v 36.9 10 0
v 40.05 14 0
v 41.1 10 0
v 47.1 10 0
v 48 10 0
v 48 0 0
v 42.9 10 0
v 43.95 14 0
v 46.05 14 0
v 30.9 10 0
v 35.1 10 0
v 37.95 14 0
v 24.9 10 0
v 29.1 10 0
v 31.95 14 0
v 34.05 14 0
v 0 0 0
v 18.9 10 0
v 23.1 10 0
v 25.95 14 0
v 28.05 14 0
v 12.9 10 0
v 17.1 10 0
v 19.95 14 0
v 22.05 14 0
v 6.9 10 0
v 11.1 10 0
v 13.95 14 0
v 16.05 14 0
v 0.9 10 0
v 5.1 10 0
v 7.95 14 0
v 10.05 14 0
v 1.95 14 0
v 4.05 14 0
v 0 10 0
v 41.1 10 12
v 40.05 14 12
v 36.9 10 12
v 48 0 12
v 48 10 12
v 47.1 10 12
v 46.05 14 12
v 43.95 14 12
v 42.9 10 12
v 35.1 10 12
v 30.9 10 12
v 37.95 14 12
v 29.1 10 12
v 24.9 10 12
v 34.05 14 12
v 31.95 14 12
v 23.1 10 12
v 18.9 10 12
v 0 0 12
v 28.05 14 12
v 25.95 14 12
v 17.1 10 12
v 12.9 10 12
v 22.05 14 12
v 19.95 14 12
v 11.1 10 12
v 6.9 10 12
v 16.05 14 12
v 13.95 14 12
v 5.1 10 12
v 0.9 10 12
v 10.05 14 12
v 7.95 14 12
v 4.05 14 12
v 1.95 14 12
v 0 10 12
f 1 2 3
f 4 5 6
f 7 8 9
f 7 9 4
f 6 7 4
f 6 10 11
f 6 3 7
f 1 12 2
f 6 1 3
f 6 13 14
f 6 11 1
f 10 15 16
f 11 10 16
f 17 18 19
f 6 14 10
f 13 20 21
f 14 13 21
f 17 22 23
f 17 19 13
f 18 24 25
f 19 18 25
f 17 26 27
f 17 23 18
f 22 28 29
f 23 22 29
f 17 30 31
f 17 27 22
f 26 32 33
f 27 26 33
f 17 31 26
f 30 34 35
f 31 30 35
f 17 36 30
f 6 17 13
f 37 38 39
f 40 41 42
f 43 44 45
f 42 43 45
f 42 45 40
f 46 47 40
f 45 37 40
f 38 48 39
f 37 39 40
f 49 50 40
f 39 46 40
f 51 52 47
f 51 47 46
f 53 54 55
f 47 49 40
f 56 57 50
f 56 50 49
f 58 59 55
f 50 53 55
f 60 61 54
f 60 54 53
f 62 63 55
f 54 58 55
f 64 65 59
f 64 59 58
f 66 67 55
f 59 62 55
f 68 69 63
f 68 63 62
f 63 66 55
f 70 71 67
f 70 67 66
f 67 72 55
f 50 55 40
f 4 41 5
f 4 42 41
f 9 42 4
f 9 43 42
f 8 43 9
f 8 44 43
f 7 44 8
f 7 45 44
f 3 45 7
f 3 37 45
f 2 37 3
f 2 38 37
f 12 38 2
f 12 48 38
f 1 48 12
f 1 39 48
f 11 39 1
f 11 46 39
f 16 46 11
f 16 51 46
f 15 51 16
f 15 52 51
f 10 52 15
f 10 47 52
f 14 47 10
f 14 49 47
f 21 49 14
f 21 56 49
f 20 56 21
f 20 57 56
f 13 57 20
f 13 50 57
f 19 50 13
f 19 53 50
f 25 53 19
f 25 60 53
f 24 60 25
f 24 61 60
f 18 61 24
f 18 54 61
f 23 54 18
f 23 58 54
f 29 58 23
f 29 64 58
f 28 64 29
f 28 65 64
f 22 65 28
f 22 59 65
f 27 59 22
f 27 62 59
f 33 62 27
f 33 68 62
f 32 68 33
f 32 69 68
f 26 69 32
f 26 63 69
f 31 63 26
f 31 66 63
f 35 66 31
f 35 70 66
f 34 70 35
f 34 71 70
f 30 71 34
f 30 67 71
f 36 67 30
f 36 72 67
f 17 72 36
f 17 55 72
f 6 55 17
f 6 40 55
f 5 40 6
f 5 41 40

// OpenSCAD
$fn = 32;

// ----------------------------------------------------------------------
// Gear rack: 8 teeth, pitch 6 mm
// ----------------------------------------------------------------------

// --- parameters (mm) ---
teeth = 8;                // number of teeth
pitch = 6;                // tooth pitch, X
root_w = 4.2;             // tooth width at the root
tip_w = 2.1;              // tooth width at the tip
base_h = 10;              // rack body height, Y
tooth_h = 4;              // tooth height above the body
plate_t = 12;             // rack width, Z (extrusion height)
fit_tol = 0.05;           // declared fit tolerance (prompt contract)
free_tol = 0.2;           // declared free tolerance (prompt contract)

rack_l = teeth * pitch;  // overall length
total_h = base_h + tooth_h;  // overall height

profile = [[0, 0], [48, 0], [48, 10], [47.1, 10], [46.05, 14], [43.95, 14], [42.9, 10], [41.1, 10], [40.05, 14], [37.95, 14], [36.9, 10], [35.1, 10], [34.05, 14], [31.95, 14], [30.9, 10], [29.1, 10], [28.05, 14], [25.95, 14], [24.9, 10], [23.1, 10], [22.05, 14], [19.95, 14], [18.9, 10], [17.1, 10], [16.05, 14], [13.95, 14], [12.9, 10], [11.1, 10], [10.05, 14], [7.95, 14], [6.9, 10], [5.1, 10], [4.05, 14], [1.95, 14], [0.9, 10], [0, 10]];  // primary outline, 36 points, counter clockwise

// --- the one profile operation ---
linear_extrude(height = plate_t) polygon(points = profile);
